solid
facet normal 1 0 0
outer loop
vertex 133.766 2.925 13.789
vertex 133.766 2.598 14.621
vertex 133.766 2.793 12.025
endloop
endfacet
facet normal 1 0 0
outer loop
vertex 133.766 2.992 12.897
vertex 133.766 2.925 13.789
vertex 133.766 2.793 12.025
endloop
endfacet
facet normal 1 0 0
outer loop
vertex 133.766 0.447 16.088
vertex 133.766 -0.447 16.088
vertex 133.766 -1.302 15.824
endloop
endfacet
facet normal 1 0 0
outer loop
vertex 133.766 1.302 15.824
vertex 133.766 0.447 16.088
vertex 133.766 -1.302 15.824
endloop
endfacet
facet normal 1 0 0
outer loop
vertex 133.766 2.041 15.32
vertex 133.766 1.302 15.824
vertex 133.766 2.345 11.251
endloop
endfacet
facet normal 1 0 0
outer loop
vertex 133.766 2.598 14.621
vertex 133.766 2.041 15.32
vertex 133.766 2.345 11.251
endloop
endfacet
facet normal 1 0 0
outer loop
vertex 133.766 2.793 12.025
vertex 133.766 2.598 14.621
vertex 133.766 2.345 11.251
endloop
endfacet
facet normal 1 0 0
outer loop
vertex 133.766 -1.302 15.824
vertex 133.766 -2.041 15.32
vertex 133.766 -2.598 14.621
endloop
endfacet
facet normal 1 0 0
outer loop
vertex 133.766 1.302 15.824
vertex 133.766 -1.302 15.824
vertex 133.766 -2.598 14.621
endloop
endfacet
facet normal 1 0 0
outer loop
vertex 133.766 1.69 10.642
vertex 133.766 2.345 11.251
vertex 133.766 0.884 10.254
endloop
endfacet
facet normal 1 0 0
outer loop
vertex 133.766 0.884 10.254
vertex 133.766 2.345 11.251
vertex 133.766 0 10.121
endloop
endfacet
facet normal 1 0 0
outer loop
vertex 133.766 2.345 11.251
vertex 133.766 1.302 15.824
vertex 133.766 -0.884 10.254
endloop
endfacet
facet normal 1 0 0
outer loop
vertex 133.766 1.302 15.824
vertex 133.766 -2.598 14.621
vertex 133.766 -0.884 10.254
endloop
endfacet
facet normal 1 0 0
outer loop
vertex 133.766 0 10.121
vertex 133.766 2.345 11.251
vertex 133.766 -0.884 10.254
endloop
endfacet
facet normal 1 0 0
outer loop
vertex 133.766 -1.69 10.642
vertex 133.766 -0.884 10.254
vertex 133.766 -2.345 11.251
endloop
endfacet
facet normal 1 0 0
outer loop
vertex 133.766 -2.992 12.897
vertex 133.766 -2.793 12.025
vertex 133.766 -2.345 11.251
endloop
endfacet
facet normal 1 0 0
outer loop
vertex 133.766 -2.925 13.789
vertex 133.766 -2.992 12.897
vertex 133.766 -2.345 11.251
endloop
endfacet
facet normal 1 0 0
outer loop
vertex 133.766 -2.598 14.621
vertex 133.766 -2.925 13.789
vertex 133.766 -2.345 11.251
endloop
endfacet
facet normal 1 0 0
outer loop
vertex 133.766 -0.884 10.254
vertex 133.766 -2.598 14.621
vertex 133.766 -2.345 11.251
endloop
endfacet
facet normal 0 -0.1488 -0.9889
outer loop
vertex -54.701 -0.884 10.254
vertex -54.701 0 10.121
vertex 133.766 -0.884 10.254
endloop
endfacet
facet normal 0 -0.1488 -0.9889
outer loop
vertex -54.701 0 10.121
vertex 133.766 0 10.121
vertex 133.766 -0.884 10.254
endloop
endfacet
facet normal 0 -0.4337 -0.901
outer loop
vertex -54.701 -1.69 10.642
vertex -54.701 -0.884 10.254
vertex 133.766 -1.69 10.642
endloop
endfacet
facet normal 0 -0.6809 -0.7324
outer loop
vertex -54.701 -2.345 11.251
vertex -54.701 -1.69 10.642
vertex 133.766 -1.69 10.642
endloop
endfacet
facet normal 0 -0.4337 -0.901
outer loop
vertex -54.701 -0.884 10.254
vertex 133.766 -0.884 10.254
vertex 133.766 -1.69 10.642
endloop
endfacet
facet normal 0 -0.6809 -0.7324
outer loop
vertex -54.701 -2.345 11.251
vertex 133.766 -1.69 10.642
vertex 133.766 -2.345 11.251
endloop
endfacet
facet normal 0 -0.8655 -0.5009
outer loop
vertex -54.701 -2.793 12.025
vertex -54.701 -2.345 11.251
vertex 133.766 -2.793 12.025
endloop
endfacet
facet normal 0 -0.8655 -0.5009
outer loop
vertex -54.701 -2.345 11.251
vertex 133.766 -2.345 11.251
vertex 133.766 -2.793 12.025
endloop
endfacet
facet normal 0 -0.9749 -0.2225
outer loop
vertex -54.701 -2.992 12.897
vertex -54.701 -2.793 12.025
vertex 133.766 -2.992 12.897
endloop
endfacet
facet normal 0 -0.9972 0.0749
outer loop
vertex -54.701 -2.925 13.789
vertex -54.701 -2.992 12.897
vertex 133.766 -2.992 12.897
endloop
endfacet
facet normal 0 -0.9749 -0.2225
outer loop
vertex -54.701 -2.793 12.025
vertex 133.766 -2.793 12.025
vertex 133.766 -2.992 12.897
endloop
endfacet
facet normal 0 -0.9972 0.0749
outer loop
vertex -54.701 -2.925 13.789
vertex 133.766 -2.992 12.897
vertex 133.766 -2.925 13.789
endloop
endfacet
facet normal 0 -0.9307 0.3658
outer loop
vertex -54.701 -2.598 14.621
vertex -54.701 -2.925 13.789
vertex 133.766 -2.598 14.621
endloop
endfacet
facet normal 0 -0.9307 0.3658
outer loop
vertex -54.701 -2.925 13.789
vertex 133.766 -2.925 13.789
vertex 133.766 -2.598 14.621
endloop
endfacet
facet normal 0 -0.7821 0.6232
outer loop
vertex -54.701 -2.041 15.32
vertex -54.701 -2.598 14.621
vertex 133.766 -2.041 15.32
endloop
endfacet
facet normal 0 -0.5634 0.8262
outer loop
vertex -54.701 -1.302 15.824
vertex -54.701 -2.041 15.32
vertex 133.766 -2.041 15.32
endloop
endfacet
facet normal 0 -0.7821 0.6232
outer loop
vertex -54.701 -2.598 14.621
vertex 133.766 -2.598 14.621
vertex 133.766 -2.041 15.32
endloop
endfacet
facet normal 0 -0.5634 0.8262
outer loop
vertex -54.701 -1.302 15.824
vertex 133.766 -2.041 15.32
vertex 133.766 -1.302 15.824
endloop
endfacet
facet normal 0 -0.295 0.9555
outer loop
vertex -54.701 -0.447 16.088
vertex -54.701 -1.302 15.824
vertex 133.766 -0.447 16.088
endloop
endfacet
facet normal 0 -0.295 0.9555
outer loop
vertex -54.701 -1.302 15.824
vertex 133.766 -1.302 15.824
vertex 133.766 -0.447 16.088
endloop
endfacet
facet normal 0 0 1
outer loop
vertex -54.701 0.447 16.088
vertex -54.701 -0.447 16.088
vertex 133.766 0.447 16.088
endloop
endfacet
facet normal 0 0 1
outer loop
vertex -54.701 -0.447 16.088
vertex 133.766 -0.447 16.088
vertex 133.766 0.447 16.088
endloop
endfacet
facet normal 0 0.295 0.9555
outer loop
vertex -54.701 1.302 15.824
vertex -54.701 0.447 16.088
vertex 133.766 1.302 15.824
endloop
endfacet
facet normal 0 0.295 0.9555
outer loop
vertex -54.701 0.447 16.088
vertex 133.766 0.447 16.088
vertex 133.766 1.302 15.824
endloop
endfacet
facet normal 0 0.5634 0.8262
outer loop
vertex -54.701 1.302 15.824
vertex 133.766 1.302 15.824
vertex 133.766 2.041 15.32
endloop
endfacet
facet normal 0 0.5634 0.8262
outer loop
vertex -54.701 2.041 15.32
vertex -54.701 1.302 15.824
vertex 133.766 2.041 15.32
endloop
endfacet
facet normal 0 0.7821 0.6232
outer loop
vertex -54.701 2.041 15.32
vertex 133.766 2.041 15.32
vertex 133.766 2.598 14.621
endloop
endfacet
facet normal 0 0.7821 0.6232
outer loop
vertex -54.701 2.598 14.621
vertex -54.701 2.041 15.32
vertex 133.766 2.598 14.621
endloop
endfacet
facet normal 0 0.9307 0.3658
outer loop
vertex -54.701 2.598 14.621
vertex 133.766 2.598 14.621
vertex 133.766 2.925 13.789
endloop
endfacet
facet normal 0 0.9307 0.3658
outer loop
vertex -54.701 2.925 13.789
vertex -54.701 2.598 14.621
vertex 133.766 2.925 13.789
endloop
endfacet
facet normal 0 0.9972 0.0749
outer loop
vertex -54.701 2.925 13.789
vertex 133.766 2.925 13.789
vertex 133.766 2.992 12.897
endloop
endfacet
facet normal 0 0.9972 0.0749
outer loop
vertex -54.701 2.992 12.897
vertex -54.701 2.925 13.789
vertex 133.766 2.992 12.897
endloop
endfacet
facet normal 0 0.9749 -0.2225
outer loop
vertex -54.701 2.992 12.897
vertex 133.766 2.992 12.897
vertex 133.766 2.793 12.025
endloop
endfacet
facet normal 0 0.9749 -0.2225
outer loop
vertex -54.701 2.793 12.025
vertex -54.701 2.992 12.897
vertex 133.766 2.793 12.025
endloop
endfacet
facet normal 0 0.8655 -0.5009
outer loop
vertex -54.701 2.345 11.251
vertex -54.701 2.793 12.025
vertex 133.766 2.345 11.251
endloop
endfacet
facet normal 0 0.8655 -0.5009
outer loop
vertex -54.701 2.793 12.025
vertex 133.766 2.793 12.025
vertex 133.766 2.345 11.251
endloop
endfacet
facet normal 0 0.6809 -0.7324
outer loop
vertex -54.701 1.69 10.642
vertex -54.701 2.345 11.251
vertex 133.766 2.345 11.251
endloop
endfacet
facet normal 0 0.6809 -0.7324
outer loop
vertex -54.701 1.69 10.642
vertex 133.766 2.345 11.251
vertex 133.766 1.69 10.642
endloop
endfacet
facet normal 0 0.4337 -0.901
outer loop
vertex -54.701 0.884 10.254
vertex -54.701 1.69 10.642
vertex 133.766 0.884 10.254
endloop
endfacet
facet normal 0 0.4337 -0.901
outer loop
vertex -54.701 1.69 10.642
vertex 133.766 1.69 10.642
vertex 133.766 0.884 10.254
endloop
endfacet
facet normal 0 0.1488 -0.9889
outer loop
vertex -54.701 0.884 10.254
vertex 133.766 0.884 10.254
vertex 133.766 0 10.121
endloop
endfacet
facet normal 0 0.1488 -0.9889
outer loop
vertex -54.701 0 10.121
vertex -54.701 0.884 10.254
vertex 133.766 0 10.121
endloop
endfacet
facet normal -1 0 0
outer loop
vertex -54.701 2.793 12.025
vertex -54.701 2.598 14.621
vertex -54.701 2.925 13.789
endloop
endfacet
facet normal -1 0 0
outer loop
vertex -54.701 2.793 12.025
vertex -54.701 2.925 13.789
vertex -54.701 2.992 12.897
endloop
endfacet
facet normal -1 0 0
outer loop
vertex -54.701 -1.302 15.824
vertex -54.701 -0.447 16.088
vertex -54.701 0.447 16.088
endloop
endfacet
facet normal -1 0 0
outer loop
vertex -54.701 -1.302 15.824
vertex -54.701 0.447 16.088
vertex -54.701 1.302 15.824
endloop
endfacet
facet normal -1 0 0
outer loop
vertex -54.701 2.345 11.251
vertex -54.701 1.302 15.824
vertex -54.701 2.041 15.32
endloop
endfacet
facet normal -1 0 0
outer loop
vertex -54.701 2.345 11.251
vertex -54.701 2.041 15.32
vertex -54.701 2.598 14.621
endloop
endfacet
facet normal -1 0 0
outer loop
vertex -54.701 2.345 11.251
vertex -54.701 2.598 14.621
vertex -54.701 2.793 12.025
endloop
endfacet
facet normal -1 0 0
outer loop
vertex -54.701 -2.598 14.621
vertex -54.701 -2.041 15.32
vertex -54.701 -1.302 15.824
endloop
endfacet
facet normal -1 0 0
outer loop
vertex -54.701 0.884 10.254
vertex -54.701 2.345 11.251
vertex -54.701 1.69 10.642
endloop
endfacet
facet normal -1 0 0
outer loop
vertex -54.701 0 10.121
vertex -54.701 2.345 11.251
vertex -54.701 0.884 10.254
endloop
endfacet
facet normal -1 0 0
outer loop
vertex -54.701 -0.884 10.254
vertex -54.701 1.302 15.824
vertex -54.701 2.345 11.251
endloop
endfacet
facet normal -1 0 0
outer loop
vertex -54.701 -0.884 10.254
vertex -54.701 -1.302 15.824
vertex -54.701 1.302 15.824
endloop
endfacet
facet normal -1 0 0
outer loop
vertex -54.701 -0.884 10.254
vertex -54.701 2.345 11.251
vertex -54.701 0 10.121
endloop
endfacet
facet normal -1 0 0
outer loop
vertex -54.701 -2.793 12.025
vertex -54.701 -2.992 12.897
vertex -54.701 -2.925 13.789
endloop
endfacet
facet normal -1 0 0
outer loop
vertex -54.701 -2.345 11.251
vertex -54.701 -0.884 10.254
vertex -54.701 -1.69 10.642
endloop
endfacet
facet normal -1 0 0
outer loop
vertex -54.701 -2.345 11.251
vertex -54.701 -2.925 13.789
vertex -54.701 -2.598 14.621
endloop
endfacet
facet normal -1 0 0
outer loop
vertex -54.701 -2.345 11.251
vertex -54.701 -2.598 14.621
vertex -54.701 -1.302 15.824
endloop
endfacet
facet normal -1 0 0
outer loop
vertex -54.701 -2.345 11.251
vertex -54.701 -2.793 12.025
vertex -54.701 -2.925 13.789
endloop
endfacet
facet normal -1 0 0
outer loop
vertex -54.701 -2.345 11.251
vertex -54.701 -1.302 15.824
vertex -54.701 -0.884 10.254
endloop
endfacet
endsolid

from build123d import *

# Parameters (mm, degrees)
SKETCH1_W           = 175.4666
SKETCH1_H           = 3
SKETCH3_R           = 3
BOSS_EXTRUDE1_DEPTH = 10
SKETCH7_R           = 3
BOSS_EXTRUDE5_DEPTH = 3


with BuildPart() as part:
    # Sketch1 → Revolve2 (revolve)
    with BuildSketch(Plane(origin=(0, 0, 0), x_dir=(1, 0, 0), z_dir=(0, 1, 0)), mode=Mode.PRIVATE) as revolve2_sk:
        with Locations((46.032622124, -14.621103214)):
            Rectangle(SKETCH1_W, SKETCH1_H)
    revolve(revolve2_sk.sketch.rotate(Axis((133.765922124, 0, 13.121103214), (-1, 0, 0)), 180), axis=Axis((133.765922124, 0, 13.121103214), (-1, 0, 0)))

    # Sketch3 → Boss-Extrude1 (add)
    with BuildSketch(Plane.ZY.offset(41.700677876)):
        with Locations(Location((13.121103214, 0, 0), (0, 0, 180))):
            Circle(SKETCH3_R)
    extrude(amount=BOSS_EXTRUDE1_DEPTH)

    # Sketch7 → Boss-Extrude5 (add)
    with BuildSketch(Plane.ZY.offset(51.700677876)):
        with Locations(Location((13.121103214, 0, 0), (0, 0, 180))):
            Circle(SKETCH7_R)
    extrude(amount=BOSS_EXTRUDE5_DEPTH)


solid = part.part
